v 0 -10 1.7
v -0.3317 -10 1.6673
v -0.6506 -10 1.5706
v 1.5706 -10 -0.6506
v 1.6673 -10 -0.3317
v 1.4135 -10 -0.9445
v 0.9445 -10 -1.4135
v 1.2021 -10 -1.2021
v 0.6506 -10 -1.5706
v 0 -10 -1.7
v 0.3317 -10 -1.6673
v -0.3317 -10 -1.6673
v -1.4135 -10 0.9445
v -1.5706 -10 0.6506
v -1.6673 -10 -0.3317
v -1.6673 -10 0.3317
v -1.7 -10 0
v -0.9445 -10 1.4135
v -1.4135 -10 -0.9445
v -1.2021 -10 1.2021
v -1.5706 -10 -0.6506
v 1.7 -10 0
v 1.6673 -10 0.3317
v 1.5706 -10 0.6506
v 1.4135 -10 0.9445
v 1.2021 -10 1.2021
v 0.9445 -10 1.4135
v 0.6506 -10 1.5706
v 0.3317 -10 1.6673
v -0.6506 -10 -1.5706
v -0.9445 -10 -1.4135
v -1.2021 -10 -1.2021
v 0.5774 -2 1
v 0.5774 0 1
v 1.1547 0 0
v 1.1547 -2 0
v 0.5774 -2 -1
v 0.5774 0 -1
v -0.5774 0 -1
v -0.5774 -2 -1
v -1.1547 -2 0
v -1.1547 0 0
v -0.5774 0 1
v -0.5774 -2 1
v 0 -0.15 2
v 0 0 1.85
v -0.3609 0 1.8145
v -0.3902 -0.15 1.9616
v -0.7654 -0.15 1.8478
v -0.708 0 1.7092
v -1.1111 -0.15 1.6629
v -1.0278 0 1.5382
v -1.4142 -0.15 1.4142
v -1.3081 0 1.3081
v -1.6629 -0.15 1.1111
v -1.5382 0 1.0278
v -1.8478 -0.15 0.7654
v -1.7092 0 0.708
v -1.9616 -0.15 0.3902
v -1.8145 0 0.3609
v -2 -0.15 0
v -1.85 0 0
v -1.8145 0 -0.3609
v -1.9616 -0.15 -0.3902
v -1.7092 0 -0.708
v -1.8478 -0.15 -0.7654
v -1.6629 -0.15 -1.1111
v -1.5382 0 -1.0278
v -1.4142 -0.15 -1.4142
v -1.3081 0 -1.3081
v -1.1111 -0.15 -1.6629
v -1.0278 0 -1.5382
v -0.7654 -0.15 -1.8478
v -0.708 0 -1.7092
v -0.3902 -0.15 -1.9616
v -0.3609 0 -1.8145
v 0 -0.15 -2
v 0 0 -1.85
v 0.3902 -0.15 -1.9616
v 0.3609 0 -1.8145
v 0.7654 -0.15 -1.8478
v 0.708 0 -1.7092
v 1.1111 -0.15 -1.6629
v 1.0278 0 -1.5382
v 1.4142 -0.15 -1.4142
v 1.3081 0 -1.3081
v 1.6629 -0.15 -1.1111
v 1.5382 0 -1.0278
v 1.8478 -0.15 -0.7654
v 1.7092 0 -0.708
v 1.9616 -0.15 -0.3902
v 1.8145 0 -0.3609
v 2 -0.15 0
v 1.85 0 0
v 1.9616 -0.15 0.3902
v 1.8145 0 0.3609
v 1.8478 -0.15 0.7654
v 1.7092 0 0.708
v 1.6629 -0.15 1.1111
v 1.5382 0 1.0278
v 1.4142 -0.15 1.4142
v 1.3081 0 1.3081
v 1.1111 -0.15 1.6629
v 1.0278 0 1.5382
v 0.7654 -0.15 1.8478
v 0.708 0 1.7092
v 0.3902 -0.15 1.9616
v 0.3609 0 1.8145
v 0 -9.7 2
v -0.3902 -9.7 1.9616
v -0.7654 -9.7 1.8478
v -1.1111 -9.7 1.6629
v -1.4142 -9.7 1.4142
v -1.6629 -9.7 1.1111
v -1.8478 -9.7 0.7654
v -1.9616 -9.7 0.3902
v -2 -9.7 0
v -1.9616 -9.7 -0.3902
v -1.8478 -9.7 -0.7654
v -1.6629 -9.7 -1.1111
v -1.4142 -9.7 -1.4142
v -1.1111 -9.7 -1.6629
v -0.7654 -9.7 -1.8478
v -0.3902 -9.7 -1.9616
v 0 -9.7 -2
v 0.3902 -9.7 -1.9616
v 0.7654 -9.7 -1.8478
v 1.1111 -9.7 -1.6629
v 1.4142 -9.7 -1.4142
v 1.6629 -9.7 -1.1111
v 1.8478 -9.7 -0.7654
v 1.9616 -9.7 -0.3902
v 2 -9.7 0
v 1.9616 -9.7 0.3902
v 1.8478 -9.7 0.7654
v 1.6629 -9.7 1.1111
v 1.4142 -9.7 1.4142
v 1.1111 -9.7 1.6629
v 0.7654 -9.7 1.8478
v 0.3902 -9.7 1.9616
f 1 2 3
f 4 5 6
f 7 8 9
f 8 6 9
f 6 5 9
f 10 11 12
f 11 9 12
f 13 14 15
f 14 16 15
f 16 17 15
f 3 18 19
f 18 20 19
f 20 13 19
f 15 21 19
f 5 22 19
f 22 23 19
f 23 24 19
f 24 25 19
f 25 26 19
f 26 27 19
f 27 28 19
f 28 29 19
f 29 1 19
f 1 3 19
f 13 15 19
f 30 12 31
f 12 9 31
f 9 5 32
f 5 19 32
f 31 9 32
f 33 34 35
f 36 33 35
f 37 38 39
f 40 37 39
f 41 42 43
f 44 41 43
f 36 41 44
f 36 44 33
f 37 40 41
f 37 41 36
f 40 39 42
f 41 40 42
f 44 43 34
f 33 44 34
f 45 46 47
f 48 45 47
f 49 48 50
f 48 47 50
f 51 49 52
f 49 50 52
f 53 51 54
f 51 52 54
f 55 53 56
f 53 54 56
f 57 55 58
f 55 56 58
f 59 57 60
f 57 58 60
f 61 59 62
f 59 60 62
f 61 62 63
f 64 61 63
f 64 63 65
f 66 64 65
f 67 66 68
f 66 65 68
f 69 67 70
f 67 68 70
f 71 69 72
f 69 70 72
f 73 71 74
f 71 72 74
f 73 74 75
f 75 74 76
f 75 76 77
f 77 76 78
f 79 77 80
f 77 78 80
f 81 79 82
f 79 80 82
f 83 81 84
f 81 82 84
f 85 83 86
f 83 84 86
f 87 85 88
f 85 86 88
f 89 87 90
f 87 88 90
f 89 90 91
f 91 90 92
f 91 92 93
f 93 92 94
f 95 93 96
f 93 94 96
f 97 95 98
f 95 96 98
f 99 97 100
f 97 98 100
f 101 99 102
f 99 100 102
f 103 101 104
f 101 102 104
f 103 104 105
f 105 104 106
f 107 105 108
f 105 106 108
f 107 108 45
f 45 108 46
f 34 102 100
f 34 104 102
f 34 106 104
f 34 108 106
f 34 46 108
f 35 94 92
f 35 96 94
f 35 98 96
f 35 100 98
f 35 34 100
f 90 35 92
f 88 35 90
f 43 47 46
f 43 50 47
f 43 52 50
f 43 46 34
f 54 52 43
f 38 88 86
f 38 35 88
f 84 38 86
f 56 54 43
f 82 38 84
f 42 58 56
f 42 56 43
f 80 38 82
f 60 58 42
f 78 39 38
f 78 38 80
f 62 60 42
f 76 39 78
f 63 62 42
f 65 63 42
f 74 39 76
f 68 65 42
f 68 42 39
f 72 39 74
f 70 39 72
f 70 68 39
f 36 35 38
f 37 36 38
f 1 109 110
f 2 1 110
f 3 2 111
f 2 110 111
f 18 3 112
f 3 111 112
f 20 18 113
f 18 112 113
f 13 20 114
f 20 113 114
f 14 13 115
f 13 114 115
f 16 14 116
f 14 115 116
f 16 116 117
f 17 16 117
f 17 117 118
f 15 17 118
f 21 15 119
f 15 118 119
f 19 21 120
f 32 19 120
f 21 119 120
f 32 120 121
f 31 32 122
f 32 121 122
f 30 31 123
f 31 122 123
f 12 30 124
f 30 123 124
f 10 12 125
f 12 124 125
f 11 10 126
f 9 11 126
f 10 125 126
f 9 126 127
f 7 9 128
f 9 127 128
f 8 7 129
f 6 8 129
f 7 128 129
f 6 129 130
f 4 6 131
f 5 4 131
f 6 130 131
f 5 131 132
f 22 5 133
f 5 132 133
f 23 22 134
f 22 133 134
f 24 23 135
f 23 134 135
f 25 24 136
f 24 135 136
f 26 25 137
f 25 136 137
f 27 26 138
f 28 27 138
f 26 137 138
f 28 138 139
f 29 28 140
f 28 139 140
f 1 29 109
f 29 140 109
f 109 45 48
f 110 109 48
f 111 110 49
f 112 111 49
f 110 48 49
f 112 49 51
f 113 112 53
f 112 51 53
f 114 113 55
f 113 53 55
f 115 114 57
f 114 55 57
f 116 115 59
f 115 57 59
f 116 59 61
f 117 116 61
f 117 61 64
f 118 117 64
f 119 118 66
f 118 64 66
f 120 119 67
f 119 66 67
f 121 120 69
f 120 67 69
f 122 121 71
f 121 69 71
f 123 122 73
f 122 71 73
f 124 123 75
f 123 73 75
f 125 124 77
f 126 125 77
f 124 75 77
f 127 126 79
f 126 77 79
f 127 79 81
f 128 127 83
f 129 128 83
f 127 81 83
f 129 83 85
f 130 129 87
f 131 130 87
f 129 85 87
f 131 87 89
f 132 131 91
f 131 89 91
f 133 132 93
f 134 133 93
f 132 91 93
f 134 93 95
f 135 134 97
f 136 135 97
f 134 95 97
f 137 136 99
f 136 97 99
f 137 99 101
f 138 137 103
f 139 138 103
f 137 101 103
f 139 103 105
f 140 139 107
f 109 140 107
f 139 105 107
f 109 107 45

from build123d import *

# Parameters (mm, degrees)
CROQUIS1_W            = 2
CROQUIS1_H            = 10
CORTAR_EXTRUIR2_DEPTH = 2
CHAFL_N3_SIZE         = 0.3
CHAFL_N4_SIZE         = 0.15


with BuildPart() as part:
    # Croquis1 → Revolución1 (revolve)
    with BuildSketch(Plane.XY, mode=Mode.PRIVATE) as revoluci_n1_sk:
        with Locations((1, -5)):
            Rectangle(CROQUIS1_W, CROQUIS1_H)
    revolve(revoluci_n1_sk.sketch.rotate(Axis((0, 0, 0), (0, -1, 0)), 90), axis=Axis((0, 0, 0), (0, -1, 0)))

    # Croquis3 → Cortar-Extruir2 (cut)
    with BuildSketch(Plane(origin=(0, 0, 0), x_dir=(1, 0, 0), z_dir=(0, 1, 0))):
        Polygon((-0.577350269, 1), (-1.154700538, 0), (-0.577350269, -1), (0.577350269, -1), (1.154700538, 0), (0.577350269, 1), align=None)
    extrude(amount=-CORTAR_EXTRUIR2_DEPTH, mode=Mode.SUBTRACT)

    # Chaflán3
    chafl_n3_edges = [part.edges().sort_by_distance(p)[0] for p in [
        (0, -10, -2),
    ]]
    chamfer(chafl_n3_edges, length=CHAFL_N3_SIZE)

    # Chaflán4
    chafl_n4_edges = [part.edges().sort_by_distance(p)[0] for p in [
        (0, 0, -2),
    ]]
    chamfer(chafl_n4_edges, length=CHAFL_N4_SIZE)


solid = part.part
